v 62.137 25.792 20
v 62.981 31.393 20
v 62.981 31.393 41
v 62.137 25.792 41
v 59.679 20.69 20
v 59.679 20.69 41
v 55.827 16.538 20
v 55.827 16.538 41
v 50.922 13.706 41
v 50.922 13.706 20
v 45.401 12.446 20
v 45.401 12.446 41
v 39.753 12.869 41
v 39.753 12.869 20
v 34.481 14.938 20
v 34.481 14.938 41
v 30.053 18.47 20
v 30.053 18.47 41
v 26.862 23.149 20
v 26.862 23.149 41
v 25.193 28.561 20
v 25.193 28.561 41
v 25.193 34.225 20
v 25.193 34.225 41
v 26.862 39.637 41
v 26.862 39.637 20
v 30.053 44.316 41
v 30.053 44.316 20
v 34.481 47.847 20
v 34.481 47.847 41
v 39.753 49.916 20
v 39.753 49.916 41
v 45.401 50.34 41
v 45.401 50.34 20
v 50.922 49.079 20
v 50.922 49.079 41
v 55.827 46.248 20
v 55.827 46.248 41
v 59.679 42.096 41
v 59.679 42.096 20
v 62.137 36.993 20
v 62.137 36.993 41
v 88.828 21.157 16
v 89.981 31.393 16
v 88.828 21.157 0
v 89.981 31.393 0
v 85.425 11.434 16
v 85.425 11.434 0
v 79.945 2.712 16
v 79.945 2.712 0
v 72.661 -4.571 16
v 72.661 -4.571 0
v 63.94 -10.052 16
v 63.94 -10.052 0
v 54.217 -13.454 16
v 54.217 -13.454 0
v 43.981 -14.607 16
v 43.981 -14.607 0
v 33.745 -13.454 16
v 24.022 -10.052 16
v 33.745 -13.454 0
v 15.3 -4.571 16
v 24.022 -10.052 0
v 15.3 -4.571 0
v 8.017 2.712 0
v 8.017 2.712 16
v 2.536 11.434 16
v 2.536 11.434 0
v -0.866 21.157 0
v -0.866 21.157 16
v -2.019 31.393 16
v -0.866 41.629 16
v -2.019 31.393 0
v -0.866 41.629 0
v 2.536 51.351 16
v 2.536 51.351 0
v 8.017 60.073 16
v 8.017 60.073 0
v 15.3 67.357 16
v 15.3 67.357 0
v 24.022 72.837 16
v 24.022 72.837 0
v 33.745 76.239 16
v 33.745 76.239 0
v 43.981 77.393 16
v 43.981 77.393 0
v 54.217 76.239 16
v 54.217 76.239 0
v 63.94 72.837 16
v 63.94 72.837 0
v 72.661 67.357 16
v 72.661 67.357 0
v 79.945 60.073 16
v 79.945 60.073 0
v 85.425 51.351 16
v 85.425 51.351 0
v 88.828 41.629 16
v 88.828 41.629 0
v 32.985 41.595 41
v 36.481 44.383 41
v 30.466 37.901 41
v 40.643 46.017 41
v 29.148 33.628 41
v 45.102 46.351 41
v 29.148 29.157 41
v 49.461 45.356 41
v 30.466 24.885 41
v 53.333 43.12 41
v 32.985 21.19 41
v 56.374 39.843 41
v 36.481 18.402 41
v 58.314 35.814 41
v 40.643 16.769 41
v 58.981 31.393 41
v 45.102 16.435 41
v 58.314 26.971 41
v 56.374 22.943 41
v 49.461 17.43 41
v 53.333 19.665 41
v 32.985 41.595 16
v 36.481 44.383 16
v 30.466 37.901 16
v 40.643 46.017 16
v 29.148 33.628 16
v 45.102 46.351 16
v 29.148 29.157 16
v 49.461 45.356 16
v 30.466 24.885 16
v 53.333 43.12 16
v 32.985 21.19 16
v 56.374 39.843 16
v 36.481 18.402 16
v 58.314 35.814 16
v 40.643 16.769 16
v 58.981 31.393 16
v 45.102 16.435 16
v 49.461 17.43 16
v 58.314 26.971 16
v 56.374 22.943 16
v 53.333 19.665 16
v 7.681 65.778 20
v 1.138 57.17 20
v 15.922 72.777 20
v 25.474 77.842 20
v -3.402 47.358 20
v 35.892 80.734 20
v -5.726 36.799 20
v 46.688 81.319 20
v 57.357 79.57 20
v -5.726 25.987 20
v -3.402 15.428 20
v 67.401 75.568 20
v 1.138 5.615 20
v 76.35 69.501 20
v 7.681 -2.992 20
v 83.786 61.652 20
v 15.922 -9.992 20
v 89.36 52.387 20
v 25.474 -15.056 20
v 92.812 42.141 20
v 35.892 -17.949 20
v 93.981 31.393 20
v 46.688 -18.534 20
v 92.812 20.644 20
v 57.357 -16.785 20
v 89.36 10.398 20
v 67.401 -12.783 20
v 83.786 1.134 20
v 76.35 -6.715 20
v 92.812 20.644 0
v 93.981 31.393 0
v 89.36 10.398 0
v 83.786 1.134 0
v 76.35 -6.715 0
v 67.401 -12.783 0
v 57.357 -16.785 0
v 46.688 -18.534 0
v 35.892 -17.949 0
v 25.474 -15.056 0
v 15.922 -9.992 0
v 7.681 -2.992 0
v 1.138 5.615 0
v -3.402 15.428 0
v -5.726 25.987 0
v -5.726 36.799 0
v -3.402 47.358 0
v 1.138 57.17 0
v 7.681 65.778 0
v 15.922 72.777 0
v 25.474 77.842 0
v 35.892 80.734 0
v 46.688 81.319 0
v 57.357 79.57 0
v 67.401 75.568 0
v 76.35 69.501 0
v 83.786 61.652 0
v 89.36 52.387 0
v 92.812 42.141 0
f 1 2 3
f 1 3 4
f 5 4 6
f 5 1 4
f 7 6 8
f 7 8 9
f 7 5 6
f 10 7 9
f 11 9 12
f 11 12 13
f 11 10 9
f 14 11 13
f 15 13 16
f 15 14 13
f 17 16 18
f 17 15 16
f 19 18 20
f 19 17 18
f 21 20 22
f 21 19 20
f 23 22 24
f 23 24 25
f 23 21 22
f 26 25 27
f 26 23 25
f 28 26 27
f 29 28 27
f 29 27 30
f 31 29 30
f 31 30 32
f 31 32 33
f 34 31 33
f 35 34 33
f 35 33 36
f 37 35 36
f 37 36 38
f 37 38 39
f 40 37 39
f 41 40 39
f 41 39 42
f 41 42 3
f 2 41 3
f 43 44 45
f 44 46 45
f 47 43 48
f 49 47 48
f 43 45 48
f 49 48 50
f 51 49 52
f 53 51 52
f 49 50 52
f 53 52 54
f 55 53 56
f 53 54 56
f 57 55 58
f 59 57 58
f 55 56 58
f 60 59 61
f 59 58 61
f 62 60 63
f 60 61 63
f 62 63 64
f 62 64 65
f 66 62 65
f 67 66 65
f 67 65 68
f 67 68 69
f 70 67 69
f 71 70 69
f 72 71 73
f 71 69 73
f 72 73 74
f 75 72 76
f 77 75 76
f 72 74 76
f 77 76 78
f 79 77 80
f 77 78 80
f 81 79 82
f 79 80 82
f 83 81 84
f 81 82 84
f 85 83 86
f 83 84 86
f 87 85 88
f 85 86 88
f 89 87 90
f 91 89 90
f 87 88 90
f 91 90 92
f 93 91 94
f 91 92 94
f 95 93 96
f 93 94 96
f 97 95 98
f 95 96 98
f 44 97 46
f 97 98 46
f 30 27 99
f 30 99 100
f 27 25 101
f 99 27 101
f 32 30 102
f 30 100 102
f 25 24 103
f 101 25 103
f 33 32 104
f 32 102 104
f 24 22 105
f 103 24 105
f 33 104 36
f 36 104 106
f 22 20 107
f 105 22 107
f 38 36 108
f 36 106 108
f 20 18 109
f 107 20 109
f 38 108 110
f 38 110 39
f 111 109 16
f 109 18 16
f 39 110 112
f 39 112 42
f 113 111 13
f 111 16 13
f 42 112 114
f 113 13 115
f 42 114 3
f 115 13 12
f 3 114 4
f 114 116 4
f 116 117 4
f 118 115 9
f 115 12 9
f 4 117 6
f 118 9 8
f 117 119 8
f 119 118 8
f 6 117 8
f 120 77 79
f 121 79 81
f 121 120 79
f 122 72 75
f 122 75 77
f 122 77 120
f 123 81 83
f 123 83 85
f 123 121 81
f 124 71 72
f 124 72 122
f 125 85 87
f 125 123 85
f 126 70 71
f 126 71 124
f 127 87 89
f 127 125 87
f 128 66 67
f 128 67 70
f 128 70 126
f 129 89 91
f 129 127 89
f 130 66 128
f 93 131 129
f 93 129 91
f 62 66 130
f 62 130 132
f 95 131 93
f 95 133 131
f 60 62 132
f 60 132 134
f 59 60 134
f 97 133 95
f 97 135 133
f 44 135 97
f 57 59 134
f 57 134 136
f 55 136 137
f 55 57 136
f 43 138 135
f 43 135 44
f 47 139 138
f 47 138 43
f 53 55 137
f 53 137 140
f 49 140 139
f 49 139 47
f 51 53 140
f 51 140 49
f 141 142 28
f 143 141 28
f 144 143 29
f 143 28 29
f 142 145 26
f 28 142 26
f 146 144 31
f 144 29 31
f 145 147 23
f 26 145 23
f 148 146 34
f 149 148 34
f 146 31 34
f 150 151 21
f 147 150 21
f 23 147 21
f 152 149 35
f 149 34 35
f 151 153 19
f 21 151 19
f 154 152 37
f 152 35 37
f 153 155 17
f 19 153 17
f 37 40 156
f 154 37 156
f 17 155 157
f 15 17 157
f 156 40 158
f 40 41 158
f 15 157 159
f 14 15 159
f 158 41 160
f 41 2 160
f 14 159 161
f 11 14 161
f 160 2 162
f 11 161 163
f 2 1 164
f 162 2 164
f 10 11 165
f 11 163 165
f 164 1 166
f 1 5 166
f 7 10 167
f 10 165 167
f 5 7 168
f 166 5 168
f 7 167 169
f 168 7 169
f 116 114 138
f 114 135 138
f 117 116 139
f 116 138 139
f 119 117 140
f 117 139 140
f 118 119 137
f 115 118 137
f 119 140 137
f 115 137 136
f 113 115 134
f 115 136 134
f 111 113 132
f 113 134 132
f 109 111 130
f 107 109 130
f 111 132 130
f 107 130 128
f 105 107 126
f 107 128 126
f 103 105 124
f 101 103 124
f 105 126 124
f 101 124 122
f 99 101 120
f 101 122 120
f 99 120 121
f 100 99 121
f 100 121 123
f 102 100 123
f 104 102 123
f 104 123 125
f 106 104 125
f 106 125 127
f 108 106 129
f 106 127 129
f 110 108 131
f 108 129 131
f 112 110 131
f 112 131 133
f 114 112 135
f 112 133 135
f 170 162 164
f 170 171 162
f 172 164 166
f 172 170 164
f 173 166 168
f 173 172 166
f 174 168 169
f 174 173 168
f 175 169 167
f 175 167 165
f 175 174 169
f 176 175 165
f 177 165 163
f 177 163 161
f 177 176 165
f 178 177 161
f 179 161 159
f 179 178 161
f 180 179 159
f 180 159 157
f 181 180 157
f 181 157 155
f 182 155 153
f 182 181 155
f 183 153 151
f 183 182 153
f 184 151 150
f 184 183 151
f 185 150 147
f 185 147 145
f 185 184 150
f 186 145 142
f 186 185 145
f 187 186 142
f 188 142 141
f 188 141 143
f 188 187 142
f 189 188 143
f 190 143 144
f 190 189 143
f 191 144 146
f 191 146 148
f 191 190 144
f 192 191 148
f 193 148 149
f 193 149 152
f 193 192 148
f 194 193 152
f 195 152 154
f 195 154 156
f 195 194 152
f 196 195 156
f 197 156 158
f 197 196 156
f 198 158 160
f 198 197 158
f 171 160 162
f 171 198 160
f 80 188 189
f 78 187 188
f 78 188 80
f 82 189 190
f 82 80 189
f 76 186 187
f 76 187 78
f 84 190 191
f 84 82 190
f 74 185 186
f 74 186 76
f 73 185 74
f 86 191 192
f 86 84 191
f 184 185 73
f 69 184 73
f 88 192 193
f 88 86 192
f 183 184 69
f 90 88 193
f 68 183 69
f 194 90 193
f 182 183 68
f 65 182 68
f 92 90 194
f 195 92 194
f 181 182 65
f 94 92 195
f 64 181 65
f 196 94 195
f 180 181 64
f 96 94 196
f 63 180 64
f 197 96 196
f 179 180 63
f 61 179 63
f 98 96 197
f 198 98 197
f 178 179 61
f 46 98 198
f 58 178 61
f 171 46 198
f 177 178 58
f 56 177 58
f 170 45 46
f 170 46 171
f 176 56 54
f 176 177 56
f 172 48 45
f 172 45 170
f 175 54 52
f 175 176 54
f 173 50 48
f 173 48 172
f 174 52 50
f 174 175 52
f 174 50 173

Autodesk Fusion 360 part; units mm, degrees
sketch "Sketch1" plane through (0, 0, 0) normal (0, 0, 1) x (1, 0, 0) in component "base"
  circle A0 centre (43.9809, 31.3929) radius 50
  circle A1 centre (43.9809, 31.3929) radius 46
  circle A2 centre (43.9809, 31.3929) radius 19
  circle A3 centre (43.9809, 31.3929) radius 15
  dimension "d1" = 100
  dimension "d2" = 4
  dimension "d4" = 4
  dimension "d6" = 30
extrude "Extrude1" add sketch "Sketch1" against normal blind 20 contours A0 | A1 makes body 1 in component "base"
extrude "Extrude2" cut sketch "Sketch1" against normal blind 16 contours A1 bodies 1 in component "base"
extrude "Extrude3" add sketch "Sketch1" against normal blind 25 from surface at -16 contours A2 bodies 1 in component "base"
move_body "Move1" bodies 1 to x (1, 0, 0) y (0, -1, 0) z (0, 0, -1) at (0, -37.2143, -80) in component "base"
move_body "Move2" bodies 1 to x (1, 0, 0) y (0, 1, 0) z (0, 0, 1) at (0, 100, 80) in component "base"
copy_body "CutPasteBodies1" bodies 1 removing the originals makes body 2 in component "base"
component "base" placed x (1, 0, 0) y (0, 1, 0) z (0, 0, 1) at (0, 0, 0)
component "Component" placed x (1, 0, 0) y (0, 1, 0) z (0, 0, 1) at (0, 0, 0)
equation "d2 = wallthickness"
equation "wallthickness = 4 mm"
equation "d4 = wallthickness"
equation "motorDiameter = 30 mm"
equation "d6 = motorDiameter"
equation "baseHeight = 20 mm"
equation "motorBaseHeight = 25 mm"
equation "d9 = -baseHeight"
equation "d11 = wallthickness - baseHeight"
equation "d13 = -baseHeight + wallthickness"
equation "d14 = -motorBaseHeight"
